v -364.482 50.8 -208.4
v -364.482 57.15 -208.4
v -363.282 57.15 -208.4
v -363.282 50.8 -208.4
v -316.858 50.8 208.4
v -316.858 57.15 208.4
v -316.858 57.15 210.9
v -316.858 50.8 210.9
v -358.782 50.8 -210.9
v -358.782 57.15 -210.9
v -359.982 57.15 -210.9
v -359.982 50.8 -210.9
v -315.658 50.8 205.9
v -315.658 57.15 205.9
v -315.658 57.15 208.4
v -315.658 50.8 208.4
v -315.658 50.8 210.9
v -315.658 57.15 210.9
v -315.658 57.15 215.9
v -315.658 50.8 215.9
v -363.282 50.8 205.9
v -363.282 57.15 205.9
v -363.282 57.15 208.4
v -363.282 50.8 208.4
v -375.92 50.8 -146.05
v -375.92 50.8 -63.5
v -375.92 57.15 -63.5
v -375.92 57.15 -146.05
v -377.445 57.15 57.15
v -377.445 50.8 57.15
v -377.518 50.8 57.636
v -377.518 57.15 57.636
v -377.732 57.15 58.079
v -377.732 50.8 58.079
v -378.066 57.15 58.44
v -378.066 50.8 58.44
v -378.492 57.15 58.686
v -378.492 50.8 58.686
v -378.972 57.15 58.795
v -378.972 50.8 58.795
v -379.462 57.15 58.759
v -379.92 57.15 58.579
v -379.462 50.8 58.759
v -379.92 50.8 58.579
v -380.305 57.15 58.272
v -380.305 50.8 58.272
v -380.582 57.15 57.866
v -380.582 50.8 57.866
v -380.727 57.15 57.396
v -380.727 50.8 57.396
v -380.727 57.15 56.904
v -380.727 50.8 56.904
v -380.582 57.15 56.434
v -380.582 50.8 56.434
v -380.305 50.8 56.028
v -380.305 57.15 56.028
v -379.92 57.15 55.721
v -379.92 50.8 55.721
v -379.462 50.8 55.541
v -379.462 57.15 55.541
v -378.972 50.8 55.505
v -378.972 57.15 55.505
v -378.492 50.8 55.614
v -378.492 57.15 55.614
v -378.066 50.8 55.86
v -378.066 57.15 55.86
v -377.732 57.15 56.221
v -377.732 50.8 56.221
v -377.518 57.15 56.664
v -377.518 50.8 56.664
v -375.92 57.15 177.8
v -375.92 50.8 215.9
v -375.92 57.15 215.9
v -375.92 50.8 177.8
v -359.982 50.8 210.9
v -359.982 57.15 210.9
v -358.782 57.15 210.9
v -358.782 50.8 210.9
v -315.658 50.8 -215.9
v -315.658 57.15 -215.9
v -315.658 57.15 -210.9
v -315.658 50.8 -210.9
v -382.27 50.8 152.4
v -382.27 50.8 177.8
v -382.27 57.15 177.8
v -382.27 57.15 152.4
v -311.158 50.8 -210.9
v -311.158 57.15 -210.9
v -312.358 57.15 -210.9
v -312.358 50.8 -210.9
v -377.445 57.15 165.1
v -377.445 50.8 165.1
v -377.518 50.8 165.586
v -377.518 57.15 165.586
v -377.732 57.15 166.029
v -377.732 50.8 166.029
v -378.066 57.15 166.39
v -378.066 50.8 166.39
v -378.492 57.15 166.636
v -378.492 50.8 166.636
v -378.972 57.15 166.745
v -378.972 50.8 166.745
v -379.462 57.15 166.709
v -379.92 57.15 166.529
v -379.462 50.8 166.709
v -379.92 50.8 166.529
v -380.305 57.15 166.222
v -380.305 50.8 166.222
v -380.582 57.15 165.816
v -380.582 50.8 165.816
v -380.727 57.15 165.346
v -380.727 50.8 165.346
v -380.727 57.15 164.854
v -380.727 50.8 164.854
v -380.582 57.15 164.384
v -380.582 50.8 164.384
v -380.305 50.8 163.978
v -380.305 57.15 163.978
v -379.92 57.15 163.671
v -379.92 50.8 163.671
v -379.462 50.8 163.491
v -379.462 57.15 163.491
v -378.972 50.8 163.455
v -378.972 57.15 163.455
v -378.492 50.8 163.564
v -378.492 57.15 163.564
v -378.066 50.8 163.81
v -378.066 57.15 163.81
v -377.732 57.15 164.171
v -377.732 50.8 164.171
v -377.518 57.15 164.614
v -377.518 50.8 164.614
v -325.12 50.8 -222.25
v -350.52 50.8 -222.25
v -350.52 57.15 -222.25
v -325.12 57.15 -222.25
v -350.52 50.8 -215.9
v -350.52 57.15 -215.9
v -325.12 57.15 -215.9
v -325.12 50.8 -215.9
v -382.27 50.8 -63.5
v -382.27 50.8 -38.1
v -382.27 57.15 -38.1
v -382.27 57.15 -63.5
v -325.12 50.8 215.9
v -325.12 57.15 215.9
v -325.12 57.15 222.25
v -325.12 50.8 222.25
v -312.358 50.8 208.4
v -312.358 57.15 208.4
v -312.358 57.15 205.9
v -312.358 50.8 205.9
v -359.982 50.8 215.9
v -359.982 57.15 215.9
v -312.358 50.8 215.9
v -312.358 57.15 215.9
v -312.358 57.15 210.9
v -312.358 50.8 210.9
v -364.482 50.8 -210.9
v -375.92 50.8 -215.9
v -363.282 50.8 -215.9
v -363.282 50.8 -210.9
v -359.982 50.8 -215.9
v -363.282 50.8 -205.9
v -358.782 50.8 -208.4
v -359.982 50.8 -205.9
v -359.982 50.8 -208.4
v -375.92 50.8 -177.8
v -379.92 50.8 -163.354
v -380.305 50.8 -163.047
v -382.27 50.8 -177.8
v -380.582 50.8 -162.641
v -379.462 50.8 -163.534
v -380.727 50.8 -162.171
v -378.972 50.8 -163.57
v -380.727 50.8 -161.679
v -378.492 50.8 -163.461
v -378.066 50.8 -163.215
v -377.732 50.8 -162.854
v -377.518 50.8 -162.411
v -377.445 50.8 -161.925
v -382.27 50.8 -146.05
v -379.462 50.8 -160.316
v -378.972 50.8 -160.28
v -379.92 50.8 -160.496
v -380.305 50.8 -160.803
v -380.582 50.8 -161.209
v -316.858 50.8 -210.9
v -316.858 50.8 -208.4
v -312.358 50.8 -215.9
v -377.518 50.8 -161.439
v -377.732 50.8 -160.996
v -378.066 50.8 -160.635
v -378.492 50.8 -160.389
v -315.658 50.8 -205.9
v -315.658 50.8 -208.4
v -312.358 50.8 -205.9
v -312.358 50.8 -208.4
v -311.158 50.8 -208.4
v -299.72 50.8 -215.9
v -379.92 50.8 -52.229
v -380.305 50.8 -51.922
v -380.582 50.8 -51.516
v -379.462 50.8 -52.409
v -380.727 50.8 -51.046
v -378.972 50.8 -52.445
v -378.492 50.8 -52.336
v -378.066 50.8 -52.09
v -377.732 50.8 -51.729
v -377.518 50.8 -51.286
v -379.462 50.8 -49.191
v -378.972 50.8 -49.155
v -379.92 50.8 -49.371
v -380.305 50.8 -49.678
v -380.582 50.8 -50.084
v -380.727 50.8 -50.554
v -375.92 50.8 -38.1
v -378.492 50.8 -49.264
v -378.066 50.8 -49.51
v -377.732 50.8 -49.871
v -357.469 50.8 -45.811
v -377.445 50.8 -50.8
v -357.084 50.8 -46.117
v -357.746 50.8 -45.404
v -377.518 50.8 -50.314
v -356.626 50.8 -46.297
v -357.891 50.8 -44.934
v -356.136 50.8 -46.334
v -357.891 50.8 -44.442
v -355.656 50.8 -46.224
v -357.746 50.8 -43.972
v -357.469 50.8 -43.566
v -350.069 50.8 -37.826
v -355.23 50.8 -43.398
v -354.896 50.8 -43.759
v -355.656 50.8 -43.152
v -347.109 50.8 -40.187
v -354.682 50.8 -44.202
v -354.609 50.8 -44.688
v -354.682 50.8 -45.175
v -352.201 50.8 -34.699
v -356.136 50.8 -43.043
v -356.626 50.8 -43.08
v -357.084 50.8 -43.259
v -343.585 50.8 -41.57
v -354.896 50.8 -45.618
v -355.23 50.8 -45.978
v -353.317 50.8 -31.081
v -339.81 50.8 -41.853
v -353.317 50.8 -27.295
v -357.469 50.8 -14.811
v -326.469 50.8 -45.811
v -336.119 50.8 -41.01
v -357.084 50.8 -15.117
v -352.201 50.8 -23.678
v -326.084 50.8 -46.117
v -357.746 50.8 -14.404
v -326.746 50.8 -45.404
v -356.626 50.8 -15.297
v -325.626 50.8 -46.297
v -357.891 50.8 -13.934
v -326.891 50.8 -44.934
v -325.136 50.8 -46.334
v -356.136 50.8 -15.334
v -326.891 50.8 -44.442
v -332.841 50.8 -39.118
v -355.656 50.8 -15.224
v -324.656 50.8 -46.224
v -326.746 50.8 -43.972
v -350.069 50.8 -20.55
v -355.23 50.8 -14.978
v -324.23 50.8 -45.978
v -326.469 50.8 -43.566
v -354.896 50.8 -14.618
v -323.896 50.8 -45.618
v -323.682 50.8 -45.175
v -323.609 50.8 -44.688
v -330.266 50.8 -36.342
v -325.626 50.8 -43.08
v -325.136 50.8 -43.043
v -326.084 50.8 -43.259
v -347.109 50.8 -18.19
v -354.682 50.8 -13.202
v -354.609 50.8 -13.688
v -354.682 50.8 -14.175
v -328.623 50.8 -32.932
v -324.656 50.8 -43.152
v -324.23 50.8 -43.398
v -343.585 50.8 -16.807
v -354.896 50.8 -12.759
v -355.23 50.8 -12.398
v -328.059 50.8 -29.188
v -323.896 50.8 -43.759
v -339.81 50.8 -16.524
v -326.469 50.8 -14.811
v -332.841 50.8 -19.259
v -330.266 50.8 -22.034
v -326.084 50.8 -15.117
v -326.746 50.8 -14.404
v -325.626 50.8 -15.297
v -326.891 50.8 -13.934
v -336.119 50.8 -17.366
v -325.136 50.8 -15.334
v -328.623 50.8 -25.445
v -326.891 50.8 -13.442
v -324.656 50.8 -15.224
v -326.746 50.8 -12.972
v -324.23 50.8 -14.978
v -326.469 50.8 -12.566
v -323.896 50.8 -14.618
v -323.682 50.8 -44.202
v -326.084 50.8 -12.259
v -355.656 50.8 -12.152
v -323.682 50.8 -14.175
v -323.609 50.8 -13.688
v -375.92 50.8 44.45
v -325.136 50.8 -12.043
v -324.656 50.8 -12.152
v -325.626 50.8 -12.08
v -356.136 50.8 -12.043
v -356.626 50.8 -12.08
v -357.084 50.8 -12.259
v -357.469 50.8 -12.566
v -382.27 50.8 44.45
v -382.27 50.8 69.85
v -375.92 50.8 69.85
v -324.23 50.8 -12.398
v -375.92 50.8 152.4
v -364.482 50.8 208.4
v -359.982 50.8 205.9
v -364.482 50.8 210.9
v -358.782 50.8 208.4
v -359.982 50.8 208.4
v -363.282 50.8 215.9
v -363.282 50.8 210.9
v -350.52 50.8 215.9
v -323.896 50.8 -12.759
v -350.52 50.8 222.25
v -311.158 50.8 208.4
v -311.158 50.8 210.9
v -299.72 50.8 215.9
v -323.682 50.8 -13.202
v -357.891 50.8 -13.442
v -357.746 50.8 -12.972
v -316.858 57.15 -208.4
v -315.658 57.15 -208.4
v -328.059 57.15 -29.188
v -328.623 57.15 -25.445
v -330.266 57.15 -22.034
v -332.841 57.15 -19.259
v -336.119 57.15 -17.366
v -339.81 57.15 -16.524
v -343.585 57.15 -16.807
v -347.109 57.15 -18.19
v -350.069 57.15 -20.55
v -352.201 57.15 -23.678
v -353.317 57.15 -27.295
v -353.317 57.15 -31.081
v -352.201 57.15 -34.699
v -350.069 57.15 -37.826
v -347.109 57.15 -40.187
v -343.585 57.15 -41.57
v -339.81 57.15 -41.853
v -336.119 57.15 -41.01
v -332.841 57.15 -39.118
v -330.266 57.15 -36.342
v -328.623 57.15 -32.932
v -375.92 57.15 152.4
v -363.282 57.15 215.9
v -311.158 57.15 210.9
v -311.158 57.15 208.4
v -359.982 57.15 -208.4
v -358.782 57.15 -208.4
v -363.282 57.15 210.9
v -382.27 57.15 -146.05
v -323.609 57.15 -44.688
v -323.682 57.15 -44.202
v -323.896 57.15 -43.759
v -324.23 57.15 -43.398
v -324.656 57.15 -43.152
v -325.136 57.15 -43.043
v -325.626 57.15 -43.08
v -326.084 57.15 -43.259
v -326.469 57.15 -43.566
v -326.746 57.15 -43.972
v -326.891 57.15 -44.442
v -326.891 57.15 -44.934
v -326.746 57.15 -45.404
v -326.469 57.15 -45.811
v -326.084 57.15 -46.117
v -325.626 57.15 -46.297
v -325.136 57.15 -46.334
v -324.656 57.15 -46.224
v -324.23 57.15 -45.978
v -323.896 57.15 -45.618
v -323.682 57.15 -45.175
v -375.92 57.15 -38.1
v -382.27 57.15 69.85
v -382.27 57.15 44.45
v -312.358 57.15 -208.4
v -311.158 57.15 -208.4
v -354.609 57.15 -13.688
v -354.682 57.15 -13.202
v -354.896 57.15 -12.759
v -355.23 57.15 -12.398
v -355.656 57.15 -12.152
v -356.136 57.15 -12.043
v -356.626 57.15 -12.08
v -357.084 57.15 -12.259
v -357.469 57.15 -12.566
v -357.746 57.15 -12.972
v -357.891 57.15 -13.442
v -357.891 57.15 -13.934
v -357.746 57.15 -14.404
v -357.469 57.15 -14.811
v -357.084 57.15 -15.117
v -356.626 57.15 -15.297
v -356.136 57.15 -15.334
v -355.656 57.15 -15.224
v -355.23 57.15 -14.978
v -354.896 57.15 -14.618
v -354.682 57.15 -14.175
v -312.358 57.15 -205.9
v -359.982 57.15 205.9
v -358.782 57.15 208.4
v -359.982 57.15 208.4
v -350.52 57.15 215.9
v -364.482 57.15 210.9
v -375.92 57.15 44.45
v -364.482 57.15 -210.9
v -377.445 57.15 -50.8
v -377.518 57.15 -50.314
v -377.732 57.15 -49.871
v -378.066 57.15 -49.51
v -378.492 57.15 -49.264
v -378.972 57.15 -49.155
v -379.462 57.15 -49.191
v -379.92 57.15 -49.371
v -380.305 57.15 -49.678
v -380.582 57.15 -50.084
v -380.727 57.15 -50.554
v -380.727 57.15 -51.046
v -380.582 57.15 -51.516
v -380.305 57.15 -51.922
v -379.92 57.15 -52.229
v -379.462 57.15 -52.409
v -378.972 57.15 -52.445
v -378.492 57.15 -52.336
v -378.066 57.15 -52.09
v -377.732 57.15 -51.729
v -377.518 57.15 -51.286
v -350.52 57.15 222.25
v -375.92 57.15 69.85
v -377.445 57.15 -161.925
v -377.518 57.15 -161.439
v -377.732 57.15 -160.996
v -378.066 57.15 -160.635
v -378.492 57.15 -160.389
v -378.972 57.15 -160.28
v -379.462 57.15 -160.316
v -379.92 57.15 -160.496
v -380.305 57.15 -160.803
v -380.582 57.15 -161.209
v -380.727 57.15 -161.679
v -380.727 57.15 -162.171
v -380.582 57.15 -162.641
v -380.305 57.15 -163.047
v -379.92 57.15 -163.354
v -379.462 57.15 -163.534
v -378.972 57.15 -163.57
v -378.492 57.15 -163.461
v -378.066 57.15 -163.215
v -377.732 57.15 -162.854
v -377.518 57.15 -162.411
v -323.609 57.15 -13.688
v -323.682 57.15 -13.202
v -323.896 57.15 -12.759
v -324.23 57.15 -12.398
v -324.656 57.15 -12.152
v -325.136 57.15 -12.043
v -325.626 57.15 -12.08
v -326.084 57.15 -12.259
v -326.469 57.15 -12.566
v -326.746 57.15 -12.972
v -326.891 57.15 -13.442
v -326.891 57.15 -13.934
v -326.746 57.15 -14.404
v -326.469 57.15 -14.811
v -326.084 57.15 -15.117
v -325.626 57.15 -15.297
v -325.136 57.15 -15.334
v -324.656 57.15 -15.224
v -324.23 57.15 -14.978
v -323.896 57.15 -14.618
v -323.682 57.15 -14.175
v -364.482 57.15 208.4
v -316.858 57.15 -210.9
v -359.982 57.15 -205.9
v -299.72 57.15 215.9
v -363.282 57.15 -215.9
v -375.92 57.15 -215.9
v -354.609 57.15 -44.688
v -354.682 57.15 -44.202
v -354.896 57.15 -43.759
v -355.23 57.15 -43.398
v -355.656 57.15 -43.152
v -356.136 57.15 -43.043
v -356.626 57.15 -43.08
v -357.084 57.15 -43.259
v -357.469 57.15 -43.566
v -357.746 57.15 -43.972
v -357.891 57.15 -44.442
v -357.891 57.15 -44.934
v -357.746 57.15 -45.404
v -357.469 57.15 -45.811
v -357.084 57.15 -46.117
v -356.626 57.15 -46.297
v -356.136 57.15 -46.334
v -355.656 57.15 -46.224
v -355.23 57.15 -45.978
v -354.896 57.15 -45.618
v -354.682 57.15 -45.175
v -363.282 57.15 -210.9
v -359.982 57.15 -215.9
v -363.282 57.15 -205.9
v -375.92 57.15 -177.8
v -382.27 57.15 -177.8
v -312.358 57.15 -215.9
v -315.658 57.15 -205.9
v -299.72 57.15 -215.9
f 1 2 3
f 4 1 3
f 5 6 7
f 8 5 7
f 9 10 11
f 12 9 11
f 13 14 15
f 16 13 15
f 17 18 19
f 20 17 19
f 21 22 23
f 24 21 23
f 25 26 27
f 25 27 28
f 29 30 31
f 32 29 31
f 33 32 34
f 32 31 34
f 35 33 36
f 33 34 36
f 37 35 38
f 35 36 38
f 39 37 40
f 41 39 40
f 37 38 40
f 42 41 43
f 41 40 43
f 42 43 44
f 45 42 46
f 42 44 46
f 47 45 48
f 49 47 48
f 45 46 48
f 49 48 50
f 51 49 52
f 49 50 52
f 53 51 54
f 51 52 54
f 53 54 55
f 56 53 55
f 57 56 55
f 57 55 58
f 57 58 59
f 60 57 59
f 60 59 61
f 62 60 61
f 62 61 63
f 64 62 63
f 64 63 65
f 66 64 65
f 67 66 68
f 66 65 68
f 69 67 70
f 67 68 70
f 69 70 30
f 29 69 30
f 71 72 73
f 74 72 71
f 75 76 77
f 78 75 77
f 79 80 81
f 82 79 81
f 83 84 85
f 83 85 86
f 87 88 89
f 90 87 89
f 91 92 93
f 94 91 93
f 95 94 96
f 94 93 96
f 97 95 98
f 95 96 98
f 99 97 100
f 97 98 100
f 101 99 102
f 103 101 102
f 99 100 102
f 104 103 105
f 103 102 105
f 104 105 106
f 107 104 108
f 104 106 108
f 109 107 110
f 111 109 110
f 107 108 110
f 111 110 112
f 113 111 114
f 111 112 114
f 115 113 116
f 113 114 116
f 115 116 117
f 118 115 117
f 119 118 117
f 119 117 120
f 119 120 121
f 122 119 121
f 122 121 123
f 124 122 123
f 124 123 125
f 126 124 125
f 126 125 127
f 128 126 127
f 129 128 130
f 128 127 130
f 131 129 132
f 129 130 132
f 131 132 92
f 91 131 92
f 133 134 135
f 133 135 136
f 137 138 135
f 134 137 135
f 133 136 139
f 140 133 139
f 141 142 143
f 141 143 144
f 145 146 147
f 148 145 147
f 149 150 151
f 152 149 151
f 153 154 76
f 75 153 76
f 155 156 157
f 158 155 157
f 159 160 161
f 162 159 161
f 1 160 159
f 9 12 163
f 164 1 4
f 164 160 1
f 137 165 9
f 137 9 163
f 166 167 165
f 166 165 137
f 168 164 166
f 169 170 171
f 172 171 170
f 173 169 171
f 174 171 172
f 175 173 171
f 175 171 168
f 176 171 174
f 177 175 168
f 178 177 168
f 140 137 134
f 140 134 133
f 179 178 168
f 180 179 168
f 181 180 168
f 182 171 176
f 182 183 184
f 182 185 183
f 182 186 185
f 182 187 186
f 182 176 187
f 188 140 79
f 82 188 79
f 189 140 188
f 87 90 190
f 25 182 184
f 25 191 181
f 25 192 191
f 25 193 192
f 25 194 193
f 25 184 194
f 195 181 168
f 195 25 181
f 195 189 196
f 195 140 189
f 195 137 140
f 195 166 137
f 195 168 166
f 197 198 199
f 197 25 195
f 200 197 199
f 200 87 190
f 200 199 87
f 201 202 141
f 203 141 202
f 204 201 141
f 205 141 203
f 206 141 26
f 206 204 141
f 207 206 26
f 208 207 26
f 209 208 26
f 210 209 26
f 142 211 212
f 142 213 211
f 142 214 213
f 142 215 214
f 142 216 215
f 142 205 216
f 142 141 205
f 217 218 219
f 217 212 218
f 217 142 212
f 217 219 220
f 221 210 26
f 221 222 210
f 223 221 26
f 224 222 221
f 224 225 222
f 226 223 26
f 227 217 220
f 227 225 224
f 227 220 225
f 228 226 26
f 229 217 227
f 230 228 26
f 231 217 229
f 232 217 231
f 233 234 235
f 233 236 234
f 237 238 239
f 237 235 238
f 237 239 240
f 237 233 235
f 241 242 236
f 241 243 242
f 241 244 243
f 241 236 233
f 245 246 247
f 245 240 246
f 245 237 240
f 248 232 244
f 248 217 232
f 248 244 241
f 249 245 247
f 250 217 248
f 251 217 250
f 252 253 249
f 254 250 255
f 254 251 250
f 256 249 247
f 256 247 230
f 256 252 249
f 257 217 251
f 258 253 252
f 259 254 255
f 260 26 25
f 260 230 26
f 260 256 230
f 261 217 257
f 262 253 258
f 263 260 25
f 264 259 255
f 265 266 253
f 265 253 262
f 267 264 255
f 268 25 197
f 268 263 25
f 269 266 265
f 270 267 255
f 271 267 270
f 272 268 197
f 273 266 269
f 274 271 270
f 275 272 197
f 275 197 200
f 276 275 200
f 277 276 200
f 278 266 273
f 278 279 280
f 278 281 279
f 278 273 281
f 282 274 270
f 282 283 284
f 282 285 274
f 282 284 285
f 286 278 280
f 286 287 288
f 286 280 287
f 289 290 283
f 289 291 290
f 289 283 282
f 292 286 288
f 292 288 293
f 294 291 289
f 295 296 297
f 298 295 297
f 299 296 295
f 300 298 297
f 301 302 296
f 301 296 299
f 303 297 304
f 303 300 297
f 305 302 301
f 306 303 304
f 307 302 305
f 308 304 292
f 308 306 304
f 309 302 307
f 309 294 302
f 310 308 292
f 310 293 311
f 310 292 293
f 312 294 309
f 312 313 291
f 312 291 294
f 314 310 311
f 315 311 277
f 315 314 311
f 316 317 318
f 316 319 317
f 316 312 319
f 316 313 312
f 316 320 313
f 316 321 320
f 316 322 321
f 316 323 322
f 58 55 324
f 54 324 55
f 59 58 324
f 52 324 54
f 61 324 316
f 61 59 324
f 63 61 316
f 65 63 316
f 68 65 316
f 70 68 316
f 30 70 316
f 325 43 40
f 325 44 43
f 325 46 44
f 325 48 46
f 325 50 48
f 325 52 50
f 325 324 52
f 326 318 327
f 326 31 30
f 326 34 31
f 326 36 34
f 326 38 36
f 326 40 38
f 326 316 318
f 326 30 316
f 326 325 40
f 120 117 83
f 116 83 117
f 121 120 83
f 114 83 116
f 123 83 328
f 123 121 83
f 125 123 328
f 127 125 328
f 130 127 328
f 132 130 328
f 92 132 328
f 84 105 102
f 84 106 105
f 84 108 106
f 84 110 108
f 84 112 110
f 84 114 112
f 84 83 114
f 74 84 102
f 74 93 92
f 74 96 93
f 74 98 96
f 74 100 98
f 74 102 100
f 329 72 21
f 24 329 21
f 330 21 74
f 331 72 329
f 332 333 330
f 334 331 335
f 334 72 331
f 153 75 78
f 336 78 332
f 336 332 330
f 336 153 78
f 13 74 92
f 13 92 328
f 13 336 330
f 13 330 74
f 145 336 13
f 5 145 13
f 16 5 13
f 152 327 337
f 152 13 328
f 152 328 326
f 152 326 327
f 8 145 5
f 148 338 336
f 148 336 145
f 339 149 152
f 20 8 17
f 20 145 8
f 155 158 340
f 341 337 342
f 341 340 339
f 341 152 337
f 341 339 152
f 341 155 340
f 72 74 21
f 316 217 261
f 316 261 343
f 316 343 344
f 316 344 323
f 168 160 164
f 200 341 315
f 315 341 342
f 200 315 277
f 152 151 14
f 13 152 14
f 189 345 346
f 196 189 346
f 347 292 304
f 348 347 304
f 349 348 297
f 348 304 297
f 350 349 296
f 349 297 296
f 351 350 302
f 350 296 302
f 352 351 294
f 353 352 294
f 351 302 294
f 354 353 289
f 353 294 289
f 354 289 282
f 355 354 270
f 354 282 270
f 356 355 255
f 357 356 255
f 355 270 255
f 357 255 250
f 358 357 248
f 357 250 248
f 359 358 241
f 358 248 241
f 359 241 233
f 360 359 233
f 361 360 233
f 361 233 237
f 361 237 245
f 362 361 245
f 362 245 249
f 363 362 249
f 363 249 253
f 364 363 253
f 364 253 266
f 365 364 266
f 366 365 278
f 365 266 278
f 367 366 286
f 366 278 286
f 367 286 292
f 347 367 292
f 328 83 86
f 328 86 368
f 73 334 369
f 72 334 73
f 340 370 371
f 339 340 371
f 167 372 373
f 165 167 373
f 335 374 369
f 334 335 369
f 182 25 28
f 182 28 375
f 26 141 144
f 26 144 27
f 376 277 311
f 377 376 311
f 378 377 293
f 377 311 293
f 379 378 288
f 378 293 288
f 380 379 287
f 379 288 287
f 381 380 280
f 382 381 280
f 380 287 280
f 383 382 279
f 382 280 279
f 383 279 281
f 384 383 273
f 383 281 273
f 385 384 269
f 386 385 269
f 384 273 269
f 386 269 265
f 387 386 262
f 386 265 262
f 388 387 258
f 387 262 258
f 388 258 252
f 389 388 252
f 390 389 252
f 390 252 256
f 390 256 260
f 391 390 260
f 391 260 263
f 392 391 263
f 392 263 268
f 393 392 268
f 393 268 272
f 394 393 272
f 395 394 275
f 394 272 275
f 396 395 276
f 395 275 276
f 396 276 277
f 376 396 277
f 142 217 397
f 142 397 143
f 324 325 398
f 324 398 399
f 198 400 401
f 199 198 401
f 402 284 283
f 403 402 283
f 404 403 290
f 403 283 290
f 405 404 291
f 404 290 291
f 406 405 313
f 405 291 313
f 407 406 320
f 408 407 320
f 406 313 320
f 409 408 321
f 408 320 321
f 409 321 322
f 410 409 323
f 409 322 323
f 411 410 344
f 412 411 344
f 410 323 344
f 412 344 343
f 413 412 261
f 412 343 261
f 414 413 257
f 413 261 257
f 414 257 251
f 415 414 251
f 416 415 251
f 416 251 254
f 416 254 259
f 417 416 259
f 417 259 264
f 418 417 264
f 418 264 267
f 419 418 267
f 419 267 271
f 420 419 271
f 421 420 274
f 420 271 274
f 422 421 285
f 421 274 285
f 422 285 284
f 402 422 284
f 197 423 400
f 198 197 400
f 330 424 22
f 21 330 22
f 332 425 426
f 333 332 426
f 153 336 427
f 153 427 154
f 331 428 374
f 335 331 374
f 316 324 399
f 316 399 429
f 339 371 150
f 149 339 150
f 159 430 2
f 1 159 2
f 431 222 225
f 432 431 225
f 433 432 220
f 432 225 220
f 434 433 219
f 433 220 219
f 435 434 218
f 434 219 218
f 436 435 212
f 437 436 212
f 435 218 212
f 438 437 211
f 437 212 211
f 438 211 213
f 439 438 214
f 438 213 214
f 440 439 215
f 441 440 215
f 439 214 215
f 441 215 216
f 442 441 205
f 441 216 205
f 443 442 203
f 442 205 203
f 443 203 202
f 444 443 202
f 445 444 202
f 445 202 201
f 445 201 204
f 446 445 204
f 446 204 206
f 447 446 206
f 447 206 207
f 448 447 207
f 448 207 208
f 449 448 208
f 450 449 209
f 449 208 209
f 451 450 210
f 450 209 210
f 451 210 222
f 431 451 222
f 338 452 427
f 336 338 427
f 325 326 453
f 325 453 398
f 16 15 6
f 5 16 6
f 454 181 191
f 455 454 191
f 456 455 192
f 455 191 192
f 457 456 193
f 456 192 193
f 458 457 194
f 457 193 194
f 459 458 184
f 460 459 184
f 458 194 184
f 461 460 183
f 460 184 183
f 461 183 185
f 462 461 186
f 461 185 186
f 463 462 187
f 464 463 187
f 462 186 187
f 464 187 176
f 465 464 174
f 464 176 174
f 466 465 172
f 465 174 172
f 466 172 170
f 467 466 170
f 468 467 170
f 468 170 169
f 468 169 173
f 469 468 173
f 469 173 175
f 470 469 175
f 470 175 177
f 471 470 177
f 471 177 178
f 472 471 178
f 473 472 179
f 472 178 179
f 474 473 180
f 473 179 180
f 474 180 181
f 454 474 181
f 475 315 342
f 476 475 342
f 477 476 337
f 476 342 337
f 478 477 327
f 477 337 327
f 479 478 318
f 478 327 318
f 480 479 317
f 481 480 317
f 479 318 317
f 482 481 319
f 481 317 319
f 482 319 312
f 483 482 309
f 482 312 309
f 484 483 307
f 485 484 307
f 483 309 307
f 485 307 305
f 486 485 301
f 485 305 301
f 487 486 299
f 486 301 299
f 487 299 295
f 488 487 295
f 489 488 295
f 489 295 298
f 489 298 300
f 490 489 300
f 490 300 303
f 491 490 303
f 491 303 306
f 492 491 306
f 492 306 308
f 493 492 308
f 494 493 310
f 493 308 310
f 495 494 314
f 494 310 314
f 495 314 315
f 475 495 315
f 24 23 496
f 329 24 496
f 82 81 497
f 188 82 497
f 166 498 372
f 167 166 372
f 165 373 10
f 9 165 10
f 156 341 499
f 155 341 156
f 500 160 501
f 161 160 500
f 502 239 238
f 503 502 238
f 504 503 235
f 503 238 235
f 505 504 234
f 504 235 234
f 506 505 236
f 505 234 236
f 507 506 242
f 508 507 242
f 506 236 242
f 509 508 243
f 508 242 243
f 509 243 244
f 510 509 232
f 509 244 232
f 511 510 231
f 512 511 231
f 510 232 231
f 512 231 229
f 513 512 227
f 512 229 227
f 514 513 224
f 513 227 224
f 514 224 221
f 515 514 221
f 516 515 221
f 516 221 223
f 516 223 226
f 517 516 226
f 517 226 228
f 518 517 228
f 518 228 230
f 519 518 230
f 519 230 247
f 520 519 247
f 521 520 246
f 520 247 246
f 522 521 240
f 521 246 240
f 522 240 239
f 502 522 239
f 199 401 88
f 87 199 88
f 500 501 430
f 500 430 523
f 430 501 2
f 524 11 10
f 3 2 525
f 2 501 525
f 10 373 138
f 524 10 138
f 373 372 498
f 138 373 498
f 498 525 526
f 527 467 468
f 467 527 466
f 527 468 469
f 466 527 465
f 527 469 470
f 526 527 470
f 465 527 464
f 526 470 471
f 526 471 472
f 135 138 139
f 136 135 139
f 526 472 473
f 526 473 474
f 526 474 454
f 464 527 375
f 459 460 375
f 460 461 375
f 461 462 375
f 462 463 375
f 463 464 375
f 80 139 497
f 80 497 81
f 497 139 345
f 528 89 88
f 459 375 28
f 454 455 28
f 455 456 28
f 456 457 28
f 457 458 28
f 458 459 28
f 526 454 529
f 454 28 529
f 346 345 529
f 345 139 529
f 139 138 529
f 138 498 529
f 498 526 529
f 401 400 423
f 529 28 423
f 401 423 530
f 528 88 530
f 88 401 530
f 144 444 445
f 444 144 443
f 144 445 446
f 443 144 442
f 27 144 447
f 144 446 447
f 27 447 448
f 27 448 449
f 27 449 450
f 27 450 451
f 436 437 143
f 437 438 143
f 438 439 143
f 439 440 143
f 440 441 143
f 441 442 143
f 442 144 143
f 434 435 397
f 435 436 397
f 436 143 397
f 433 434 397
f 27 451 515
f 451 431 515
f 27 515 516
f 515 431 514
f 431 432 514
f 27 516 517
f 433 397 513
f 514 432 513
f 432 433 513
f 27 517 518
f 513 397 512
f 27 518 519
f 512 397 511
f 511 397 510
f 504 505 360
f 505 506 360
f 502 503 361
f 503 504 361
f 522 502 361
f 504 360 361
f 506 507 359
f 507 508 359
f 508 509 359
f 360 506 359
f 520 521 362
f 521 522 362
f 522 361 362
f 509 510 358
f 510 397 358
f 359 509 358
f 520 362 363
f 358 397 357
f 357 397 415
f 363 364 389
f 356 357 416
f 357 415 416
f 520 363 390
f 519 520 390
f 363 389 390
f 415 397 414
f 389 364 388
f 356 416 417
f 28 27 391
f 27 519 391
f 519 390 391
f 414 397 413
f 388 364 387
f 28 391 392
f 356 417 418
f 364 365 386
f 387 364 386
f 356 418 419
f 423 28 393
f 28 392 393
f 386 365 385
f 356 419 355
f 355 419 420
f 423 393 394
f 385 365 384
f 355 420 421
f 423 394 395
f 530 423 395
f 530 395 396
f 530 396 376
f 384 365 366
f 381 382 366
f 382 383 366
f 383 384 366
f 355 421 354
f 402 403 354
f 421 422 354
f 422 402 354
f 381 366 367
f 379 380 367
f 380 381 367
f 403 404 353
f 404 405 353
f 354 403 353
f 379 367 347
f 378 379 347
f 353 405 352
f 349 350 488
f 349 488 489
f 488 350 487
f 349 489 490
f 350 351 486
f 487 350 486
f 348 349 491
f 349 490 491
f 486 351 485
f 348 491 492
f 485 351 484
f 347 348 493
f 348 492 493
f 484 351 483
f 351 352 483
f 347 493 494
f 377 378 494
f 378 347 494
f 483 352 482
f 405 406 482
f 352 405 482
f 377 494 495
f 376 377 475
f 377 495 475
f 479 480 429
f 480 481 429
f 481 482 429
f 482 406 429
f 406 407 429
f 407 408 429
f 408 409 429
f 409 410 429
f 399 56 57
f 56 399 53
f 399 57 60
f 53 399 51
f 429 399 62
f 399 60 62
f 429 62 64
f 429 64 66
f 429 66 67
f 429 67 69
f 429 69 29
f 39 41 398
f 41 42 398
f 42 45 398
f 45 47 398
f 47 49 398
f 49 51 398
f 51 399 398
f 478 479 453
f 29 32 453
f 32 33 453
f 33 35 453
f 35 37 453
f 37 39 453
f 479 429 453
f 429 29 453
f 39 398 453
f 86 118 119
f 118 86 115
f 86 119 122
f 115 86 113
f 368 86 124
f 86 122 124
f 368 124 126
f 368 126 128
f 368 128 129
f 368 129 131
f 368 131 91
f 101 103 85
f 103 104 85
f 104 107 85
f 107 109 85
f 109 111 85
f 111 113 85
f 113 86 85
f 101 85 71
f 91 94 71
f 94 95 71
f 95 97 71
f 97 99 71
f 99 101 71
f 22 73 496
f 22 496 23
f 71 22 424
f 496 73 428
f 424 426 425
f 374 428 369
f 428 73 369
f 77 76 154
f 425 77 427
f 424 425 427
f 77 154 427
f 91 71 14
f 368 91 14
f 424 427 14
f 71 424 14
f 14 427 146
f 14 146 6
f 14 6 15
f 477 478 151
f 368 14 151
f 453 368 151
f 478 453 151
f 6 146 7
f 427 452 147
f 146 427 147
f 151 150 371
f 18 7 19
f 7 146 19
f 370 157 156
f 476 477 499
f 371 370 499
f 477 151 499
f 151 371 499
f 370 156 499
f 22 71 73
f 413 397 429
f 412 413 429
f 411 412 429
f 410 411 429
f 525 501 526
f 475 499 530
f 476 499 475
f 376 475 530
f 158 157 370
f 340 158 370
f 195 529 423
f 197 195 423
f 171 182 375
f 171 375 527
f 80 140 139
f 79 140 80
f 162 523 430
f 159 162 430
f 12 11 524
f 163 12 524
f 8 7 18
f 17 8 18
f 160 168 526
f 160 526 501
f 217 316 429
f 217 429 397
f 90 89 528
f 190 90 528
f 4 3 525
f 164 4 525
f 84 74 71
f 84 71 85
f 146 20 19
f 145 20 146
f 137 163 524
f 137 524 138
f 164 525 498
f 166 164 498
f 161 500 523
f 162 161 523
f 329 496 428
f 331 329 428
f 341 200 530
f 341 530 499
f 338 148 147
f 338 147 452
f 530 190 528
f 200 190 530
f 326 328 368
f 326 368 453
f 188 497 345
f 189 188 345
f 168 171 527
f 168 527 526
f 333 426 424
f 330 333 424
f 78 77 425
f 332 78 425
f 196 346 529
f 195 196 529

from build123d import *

# Parameters (mm, degrees)
SKETCH1_R           = 1.65
SKETCH1_R_2         = 12.7
BOSS_EXTRUDE1_DEPTH = 6.35


with BuildPart() as part:
    # Sketch1 → Boss-Extrude1 (new body)
    with BuildSketch(Plane.XZ.offset(-50.8)):
        Polygon((-350.52, 222.25), (-350.52, 215.9), (-359.9825, 215.9), (-359.9825, 210.9), (-358.7825, 210.9), (-358.7825, 208.4), (-359.9825, 208.4), (-359.9825, 205.9), (-363.2825, 205.9), (-363.2825, 208.4), (-364.4825, 208.4), (-364.4825, 210.9), (-363.2825, 210.9), (-363.2825, 215.9), (-375.92, 215.9), (-375.92, 177.8), (-382.27, 177.8), (-382.27, 152.4), (-375.92, 152.4), (-375.92, 69.85), (-382.27, 69.85), (-382.27, 44.45), (-375.92, 44.45), (-375.92, -38.1), (-382.27, -38.1), (-382.27, -63.5), (-375.92, -63.5), (-375.92, -146.05), (-382.27, -146.05), (-382.27, -177.8), (-375.92, -177.8), (-375.92, -215.9), (-363.2825, -215.9), (-363.2825, -210.9), (-364.4825, -210.9), (-364.4825, -208.4), (-363.2825, -208.4), (-363.2825, -205.9), (-359.9825, -205.9), (-359.9825, -208.4), (-358.7825, -208.4), (-358.7825, -210.9), (-359.9825, -210.9), (-359.9825, -215.9), (-350.52, -215.9), (-350.52, -222.25), (-325.12, -222.25), (-325.12, -215.9), (-315.6575, -215.9), (-315.6575, -210.9), (-316.8575, -210.9), (-316.8575, -208.4), (-315.6575, -208.4), (-315.6575, -205.9), (-312.3575, -205.9), (-312.3575, -208.4), (-311.1575, -208.4), (-311.1575, -210.9), (-312.3575, -210.9), (-312.3575, -215.9), (-299.72, -215.9), (-299.72, 215.9), (-312.3575, 215.9), (-312.3575, 210.9), (-311.1575, 210.9), (-311.1575, 208.4), (-312.3575, 208.4), (-312.3575, 205.9), (-315.6575, 205.9), (-315.6575, 208.4), (-316.8575, 208.4), (-316.8575, 210.9), (-315.6575, 210.9), (-315.6575, 215.9), (-325.12, 215.9), (-325.12, 222.25), align=None)
        with Locations((-379.095, 165.1)):
            Circle(SKETCH1_R, mode=Mode.SUBTRACT)
        with Locations((-379.095, 57.15)):
            Circle(SKETCH1_R, mode=Mode.SUBTRACT)
        with Locations((-379.095, -161.925)):
            Circle(SKETCH1_R, mode=Mode.SUBTRACT)
        with Locations((-379.095, -50.8)):
            Circle(SKETCH1_R, mode=Mode.SUBTRACT)
        with Locations((-325.259000014, -13.688281448)):
            Circle(SKETCH1_R, mode=Mode.SUBTRACT)
        with Locations((-356.259000014, -13.688281448)):
            Circle(SKETCH1_R, mode=Mode.SUBTRACT)
        with Locations((-325.259000014, -44.688281448)):
            Circle(SKETCH1_R, mode=Mode.SUBTRACT)
        with Locations((-356.259000014, -44.688281448)):
            Circle(SKETCH1_R, mode=Mode.SUBTRACT)
        with Locations((-340.759000014, -29.188281448)):
            Circle(SKETCH1_R_2, mode=Mode.SUBTRACT)
    extrude(amount=-BOSS_EXTRUDE1_DEPTH)


solid = part.part
